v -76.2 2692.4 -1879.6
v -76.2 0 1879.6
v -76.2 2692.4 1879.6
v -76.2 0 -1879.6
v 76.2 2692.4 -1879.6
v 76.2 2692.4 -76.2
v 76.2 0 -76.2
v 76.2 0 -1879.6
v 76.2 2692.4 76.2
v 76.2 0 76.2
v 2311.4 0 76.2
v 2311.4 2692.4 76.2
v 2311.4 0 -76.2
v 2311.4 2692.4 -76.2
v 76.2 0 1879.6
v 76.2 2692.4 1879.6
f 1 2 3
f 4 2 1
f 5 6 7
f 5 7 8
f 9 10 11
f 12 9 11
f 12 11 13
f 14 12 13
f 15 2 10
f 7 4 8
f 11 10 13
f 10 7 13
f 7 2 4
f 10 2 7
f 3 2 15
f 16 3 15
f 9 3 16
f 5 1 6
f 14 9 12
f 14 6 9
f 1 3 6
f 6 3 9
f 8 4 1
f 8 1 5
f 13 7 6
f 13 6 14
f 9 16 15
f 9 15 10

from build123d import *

# Parameters (mm, degrees)
SKETCH1_W           = 152.4
SKETCH1_H           = 3759.2
SKETCH1_W_2         = 2235.2
SKETCH1_H_2         = 152.4
BOSS_EXTRUDE1_DEPTH = 2692.4


with BuildPart() as part:
    # Sketch1 → Boss-Extrude1 (new body)
    with BuildSketch(Plane(origin=(0, 0, 0), x_dir=(1, 0, 0), z_dir=(0, 1, 0))):
        Rectangle(SKETCH1_W, SKETCH1_H)
        with Locations((1193.8, 0)):
            Rectangle(SKETCH1_W_2, SKETCH1_H_2)
    extrude(amount=BOSS_EXTRUDE1_DEPTH)


solid = part.part
